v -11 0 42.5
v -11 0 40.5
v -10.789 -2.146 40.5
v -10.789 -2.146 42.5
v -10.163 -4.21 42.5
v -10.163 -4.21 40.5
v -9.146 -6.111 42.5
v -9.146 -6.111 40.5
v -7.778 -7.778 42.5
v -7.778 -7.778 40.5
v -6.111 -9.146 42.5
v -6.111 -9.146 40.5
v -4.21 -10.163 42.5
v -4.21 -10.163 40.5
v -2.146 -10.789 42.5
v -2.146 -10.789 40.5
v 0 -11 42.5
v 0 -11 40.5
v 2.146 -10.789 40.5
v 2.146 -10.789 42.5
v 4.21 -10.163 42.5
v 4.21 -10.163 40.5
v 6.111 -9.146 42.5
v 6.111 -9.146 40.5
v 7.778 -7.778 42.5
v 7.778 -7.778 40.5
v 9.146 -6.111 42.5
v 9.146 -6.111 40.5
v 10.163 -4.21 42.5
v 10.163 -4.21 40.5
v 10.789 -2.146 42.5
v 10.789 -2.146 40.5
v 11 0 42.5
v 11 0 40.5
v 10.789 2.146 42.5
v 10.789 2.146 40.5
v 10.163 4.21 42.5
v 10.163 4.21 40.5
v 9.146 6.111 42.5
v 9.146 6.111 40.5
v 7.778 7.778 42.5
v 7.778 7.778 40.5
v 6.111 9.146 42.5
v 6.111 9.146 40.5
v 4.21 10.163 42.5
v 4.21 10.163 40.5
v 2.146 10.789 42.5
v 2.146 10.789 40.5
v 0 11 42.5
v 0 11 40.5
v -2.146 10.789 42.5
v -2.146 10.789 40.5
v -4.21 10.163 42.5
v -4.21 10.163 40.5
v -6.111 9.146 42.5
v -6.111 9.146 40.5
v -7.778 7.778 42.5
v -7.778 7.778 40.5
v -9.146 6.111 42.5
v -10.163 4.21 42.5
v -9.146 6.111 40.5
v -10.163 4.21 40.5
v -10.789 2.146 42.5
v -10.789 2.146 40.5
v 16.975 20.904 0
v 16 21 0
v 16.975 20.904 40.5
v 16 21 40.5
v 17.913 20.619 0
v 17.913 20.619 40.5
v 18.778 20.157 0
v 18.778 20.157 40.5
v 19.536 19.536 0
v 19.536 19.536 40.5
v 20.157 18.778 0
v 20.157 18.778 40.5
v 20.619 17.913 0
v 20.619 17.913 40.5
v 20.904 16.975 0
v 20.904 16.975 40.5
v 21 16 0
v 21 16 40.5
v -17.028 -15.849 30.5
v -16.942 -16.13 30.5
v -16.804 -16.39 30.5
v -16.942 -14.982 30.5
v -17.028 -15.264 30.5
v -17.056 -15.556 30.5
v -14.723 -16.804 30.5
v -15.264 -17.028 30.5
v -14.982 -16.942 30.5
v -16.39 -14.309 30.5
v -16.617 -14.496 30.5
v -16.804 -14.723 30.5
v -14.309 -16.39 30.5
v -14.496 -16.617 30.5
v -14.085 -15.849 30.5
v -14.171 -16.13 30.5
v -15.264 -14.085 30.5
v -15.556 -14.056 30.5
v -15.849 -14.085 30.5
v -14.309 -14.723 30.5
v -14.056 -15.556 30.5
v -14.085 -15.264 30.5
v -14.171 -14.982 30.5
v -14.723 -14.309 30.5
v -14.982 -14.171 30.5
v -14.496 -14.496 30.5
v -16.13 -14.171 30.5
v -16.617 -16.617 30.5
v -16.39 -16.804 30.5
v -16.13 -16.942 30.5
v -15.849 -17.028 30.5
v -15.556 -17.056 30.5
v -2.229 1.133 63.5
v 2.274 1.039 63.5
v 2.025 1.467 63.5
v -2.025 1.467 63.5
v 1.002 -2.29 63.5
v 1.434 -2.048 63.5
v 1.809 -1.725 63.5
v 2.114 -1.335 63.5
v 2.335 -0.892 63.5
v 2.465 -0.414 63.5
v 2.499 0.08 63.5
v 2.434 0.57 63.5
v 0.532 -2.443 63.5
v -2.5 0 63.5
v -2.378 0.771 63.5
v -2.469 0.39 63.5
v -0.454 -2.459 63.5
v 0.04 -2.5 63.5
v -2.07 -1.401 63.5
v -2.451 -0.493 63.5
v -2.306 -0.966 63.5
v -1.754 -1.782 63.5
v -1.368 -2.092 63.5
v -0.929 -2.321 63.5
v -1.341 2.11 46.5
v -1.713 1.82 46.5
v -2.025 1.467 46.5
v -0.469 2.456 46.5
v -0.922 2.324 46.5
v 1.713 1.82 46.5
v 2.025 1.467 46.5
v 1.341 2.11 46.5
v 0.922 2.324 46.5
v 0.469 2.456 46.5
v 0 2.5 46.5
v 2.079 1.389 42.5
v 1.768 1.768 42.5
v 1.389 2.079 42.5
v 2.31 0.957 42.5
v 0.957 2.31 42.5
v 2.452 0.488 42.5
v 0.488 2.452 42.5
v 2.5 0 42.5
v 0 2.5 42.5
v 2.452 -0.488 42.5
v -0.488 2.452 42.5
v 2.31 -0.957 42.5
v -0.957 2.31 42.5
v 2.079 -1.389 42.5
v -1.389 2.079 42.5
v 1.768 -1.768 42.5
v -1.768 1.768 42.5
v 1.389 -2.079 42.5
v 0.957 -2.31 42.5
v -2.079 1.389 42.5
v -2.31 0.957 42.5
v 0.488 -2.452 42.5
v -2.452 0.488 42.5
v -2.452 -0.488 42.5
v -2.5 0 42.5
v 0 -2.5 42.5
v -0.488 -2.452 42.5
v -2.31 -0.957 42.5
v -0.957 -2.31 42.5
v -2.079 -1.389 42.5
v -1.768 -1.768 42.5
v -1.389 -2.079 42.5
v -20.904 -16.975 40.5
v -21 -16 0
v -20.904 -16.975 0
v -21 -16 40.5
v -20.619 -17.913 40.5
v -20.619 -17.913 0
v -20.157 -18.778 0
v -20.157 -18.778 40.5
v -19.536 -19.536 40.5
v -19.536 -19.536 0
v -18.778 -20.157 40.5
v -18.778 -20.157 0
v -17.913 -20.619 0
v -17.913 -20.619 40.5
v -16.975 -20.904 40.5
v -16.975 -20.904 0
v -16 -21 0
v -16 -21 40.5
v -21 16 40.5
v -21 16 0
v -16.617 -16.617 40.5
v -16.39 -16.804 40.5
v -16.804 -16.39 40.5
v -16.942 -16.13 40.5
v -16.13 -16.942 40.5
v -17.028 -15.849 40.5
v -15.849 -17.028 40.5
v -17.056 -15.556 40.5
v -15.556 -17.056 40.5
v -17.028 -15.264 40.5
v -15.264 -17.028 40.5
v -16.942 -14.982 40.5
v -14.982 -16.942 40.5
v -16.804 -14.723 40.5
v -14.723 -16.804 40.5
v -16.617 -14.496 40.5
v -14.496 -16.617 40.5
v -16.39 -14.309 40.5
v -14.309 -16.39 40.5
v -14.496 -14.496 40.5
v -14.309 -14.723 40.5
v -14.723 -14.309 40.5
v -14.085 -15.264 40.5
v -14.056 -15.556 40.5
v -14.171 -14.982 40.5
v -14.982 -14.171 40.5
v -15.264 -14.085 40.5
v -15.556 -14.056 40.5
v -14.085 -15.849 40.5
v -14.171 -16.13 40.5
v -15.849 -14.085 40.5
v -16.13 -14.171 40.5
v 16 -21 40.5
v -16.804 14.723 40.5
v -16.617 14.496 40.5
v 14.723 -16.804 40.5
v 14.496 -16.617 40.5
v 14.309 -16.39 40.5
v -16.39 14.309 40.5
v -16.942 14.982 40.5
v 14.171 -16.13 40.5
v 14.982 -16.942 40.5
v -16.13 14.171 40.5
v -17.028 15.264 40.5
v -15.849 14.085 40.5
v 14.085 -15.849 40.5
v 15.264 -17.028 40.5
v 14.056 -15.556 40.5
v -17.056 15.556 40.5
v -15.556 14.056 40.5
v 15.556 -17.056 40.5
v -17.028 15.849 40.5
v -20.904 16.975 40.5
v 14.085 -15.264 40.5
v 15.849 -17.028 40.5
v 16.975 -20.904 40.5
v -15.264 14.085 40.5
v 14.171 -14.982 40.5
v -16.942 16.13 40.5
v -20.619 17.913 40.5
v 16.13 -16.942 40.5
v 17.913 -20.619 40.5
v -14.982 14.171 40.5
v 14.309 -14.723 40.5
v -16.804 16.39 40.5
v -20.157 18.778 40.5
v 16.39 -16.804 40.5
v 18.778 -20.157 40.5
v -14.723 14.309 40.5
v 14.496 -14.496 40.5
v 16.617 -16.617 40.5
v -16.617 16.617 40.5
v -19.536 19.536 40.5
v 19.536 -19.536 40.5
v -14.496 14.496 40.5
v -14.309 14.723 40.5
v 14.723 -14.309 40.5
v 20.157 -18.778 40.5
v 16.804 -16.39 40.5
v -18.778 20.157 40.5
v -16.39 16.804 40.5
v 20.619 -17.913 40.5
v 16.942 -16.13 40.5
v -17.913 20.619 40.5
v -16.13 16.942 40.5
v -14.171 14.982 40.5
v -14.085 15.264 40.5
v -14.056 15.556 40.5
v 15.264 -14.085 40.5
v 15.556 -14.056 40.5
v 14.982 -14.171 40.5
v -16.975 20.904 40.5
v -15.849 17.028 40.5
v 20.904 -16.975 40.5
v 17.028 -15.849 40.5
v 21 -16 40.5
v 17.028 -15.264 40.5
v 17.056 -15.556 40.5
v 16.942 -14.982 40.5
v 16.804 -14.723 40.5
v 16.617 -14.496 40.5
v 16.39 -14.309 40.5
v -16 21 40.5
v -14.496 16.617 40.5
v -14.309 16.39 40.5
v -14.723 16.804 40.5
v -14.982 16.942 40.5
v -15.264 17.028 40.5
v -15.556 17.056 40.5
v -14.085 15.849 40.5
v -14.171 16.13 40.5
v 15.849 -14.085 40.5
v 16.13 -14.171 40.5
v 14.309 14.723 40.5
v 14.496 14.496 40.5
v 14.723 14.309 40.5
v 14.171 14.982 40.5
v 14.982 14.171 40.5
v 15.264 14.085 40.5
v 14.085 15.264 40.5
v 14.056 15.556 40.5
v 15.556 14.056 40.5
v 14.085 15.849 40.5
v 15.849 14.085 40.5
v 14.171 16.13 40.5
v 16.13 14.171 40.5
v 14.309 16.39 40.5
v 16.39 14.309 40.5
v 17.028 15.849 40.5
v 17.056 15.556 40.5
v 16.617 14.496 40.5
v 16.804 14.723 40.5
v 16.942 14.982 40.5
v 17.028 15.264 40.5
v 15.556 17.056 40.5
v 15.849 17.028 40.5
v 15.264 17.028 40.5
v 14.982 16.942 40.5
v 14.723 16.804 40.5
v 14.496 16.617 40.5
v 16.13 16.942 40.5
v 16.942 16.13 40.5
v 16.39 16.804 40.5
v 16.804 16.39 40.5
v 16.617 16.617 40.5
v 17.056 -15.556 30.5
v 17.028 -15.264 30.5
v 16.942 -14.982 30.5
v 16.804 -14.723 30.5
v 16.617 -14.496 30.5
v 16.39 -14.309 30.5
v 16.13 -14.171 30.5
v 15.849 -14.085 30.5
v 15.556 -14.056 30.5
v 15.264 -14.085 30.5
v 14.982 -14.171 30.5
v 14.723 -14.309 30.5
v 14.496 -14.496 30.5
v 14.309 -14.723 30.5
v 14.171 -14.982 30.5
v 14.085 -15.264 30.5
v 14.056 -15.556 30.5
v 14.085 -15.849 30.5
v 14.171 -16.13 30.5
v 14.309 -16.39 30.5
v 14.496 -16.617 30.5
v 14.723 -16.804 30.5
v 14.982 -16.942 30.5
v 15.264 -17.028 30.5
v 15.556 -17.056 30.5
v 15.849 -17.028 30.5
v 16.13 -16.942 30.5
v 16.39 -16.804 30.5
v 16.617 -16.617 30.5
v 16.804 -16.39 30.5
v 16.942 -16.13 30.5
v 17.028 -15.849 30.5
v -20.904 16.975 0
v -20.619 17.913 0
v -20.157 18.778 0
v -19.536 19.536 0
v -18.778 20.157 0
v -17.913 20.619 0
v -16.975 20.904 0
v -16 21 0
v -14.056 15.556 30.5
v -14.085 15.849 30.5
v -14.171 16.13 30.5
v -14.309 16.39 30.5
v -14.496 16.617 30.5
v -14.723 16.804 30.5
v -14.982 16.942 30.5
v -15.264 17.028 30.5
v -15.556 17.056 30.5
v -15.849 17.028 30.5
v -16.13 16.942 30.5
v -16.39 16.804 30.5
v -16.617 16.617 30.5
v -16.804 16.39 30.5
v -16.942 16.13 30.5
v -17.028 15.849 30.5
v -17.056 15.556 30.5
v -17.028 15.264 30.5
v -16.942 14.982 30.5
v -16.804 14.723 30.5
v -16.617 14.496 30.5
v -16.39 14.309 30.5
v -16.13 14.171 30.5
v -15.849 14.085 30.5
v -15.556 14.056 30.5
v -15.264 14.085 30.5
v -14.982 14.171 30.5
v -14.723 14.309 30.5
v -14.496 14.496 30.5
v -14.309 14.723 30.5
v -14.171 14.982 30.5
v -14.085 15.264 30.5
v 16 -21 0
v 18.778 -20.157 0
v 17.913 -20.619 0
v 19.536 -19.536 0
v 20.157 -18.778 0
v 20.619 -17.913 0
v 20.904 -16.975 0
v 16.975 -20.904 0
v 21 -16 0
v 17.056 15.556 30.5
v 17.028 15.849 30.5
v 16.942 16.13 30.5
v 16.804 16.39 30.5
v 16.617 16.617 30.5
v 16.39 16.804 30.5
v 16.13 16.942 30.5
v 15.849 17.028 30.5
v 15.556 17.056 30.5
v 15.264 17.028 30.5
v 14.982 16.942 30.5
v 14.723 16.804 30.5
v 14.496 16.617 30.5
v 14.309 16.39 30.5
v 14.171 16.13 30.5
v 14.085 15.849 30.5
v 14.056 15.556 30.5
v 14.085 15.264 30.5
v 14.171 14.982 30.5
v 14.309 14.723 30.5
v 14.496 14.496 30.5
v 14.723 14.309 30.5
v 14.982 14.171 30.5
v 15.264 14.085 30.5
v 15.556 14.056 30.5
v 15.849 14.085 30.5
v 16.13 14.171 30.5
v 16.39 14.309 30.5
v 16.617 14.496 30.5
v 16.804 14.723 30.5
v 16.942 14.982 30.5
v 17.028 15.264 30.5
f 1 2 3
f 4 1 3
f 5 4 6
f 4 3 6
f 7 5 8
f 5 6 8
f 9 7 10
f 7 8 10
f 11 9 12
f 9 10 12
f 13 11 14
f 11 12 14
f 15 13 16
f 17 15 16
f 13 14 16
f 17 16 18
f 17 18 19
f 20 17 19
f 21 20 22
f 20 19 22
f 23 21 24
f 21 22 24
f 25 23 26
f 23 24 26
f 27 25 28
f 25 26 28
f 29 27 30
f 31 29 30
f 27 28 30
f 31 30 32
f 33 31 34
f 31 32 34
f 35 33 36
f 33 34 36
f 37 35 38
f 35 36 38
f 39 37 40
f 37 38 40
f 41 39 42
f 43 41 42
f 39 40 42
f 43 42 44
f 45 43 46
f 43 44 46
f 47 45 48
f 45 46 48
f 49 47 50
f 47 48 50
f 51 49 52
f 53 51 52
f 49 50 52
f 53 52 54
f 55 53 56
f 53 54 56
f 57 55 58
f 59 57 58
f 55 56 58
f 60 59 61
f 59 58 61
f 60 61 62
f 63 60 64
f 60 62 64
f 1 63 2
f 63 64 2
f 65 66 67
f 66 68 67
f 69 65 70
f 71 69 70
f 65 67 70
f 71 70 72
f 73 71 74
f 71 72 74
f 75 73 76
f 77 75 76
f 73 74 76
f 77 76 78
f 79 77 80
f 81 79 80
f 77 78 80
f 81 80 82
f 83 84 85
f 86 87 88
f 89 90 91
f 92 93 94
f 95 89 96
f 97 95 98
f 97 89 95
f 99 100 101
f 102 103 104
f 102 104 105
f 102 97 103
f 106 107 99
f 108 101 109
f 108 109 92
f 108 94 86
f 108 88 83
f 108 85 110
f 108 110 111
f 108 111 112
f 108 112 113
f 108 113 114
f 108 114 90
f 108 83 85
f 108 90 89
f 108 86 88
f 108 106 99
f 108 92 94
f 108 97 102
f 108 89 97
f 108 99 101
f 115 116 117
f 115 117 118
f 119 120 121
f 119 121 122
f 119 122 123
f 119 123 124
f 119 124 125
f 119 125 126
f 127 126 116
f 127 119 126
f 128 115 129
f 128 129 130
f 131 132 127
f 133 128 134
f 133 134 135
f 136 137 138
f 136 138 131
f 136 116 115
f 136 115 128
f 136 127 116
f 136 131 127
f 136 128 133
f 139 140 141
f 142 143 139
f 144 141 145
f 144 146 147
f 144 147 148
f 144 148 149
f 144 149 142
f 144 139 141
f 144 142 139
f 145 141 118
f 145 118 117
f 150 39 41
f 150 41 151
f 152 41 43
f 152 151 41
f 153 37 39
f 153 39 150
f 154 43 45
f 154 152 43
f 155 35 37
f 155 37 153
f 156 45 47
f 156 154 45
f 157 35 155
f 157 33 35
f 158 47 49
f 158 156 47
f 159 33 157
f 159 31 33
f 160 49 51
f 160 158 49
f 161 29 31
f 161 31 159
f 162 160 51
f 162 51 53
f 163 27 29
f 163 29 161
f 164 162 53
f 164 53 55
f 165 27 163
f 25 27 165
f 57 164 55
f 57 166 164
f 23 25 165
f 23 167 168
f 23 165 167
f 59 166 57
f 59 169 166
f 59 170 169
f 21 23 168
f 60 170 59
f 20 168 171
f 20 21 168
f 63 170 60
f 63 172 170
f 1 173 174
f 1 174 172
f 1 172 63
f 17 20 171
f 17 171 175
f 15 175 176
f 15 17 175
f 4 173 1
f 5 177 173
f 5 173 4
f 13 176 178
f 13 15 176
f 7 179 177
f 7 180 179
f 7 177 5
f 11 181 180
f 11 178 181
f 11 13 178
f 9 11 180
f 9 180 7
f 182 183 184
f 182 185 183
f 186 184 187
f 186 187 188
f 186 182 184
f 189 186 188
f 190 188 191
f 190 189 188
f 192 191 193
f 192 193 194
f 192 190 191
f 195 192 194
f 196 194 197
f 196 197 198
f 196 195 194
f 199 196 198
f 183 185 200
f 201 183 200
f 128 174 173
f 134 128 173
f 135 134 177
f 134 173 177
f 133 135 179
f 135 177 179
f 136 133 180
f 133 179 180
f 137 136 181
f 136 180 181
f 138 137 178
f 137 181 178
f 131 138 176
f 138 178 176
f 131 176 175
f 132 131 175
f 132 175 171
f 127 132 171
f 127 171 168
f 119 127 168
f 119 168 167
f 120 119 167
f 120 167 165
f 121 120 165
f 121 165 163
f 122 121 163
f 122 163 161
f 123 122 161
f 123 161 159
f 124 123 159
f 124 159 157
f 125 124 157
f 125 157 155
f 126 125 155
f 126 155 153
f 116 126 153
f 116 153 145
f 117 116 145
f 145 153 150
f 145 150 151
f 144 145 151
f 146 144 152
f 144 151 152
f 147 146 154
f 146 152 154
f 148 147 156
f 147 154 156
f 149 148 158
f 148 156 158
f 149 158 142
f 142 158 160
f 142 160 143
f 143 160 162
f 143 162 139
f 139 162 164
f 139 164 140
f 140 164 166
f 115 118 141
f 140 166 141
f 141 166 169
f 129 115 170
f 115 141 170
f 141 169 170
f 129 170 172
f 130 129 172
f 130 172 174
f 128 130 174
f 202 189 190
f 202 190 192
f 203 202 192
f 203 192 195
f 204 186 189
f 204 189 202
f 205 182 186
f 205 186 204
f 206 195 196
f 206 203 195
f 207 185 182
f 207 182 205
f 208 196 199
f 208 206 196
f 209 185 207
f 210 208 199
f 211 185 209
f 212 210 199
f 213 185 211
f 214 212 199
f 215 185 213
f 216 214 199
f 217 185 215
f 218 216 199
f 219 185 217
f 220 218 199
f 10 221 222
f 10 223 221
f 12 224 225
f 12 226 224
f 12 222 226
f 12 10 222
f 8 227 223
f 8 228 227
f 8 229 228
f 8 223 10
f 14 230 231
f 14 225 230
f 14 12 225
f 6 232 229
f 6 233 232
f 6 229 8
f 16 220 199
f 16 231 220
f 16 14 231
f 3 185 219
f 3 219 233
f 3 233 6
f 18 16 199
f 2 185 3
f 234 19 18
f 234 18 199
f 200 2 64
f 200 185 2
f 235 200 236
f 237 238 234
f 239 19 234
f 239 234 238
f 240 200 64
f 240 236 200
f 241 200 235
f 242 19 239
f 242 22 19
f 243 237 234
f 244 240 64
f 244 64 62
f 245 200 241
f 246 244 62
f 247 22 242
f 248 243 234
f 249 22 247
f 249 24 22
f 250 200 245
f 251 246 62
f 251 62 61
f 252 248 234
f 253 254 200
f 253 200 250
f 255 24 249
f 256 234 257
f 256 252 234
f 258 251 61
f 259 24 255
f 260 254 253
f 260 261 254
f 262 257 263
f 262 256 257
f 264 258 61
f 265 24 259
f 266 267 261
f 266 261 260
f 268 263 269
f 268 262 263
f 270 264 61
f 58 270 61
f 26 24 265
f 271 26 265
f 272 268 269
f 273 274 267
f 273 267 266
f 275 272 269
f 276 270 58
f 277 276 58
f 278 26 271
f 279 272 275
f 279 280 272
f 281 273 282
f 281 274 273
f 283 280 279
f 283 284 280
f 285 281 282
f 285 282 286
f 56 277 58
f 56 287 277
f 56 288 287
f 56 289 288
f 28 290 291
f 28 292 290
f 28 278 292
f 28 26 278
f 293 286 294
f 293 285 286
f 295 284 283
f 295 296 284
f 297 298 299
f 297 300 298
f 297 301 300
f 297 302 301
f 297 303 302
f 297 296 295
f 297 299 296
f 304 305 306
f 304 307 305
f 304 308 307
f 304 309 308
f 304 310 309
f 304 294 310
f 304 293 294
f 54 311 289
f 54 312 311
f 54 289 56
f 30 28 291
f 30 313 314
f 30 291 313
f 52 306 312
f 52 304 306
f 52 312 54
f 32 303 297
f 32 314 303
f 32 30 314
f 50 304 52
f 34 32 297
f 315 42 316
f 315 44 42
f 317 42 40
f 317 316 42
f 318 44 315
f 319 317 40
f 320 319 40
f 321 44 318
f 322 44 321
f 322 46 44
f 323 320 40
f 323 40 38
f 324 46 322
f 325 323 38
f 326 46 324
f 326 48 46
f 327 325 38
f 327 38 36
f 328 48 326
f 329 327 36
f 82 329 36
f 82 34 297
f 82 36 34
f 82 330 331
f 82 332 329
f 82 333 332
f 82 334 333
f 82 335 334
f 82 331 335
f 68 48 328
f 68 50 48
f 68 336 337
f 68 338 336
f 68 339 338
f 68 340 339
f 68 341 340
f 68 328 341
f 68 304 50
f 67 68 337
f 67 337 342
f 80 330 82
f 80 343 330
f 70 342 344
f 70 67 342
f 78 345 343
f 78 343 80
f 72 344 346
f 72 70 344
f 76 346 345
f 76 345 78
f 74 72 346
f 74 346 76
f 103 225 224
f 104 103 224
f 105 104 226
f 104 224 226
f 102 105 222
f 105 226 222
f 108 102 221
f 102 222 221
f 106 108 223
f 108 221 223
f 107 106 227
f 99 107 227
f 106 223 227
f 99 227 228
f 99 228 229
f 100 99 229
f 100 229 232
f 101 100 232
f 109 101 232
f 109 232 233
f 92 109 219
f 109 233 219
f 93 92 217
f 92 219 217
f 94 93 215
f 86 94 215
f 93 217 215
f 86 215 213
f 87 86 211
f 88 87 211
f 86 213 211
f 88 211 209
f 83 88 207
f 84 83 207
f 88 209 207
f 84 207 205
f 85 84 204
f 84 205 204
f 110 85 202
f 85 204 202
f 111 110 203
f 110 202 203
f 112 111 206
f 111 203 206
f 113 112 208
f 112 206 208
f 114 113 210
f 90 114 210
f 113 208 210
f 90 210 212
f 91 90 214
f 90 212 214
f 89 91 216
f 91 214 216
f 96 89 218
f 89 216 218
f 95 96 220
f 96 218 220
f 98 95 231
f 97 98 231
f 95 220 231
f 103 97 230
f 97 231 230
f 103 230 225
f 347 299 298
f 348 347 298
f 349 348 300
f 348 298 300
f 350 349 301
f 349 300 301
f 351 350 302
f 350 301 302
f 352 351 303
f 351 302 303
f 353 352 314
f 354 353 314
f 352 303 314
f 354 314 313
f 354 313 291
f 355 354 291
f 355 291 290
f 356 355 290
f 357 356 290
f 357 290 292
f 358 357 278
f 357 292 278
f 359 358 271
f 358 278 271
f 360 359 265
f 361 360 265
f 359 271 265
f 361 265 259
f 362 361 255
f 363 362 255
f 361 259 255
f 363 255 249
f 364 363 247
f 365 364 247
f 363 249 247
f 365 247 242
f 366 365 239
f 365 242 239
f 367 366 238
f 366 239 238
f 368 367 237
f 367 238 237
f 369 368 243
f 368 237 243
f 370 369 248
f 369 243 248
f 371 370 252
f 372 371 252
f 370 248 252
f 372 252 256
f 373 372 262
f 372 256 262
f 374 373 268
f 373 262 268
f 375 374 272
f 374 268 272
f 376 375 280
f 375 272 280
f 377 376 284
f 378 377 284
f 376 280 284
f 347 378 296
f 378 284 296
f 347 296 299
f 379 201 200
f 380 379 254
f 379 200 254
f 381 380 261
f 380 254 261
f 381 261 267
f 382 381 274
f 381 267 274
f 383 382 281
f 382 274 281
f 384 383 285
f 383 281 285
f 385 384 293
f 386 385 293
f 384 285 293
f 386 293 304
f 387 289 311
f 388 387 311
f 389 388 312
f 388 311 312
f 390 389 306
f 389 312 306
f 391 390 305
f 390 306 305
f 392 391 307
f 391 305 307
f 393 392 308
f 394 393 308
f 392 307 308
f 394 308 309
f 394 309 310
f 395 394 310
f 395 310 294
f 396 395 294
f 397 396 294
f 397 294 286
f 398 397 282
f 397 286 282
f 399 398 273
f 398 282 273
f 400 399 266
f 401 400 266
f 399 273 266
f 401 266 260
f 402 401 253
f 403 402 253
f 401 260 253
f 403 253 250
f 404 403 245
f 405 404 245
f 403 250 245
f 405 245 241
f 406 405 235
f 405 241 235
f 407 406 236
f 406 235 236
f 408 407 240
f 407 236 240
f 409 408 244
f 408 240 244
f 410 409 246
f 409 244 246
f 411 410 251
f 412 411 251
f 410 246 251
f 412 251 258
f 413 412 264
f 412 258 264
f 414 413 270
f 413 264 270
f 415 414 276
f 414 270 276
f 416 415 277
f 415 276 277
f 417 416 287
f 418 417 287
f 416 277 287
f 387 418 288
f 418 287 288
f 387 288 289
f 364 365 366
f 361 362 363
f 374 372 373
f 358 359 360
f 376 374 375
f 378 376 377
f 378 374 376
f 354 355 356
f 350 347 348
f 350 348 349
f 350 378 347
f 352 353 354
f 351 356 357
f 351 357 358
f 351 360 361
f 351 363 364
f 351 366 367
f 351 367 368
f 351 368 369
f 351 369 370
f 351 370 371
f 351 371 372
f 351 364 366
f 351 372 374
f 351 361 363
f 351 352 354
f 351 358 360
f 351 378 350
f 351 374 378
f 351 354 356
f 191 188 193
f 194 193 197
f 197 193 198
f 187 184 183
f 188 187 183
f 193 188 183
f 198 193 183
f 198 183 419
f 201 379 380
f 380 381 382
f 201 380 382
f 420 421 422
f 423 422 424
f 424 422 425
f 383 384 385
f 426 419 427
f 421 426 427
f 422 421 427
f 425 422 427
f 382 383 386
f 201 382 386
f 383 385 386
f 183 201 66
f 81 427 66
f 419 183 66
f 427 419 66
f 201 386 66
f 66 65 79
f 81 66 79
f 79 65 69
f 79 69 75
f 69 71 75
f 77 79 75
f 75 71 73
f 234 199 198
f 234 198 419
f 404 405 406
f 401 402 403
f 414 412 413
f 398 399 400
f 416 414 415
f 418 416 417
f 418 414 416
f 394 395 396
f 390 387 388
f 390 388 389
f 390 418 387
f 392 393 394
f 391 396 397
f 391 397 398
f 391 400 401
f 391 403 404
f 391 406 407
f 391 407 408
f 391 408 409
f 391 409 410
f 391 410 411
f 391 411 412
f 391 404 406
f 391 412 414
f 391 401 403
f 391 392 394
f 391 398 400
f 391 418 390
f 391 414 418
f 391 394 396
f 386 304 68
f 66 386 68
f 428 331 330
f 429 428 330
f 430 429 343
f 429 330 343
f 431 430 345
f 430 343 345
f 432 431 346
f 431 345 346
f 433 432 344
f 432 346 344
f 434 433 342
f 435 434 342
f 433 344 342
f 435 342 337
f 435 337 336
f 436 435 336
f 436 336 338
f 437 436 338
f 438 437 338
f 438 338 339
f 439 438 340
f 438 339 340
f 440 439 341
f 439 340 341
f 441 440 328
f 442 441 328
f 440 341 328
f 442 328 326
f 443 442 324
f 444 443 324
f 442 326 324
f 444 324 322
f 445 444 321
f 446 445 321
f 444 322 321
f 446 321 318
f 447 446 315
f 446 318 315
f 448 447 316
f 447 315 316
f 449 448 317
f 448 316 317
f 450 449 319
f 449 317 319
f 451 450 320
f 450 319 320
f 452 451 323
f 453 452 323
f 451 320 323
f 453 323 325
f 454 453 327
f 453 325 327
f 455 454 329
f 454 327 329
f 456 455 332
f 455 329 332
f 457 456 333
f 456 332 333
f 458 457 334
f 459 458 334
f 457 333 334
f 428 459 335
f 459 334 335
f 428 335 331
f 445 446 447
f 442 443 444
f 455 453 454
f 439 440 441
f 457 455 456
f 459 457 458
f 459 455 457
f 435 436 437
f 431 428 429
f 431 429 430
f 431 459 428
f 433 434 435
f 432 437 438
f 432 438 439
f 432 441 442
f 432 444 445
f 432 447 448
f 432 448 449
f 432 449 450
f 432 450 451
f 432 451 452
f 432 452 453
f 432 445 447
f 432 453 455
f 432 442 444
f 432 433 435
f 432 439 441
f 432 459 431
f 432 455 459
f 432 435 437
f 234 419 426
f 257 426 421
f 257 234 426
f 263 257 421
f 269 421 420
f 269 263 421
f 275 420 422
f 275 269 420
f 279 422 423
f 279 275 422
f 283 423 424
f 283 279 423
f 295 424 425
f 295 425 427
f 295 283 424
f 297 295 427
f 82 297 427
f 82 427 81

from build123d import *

# Parameters (mm, degrees)
SKETCH1_W           = 42
SKETCH1_H           = 42
BOSS_EXTRUDE1_DEPTH = 40.5
SKETCH2_R           = 11
BOSS_EXTRUDE2_DEPTH = 2
SKETCH3_R           = 2.5
BOSS_EXTRUDE3_DEPTH = 21
FILLET1_R           = 5
SKETCH4_R           = 1.5
CUT_EXTRUDE1_DEPTH  = 10
CUT_EXTRUDE2_START  = -17
CUT_EXTRUDE2_DEPTH  = 17


with BuildPart() as part:
    # Sketch1 → Boss-Extrude1 (new body)
    with BuildSketch(Plane.XY):
        Rectangle(SKETCH1_W, SKETCH1_H)
    extrude(amount=BOSS_EXTRUDE1_DEPTH)

    # Sketch2 → Boss-Extrude2 (add)
    with BuildSketch(Plane.XY.offset(40.5)):
        with Locations(Location((0, 0, 0), (0, 0, 180))):
            Circle(SKETCH2_R)
    extrude(amount=BOSS_EXTRUDE2_DEPTH)

    # Sketch3 → Boss-Extrude3 (add)
    with BuildSketch(Plane.XY.offset(42.5)):
        with Locations(Location((0, 0, 0), (0, 0, 180))):
            Circle(SKETCH3_R)
    extrude(amount=BOSS_EXTRUDE3_DEPTH)

    # Fillet1
    fillet1_edges = [part.edges().sort_by_distance(p)[0] for p in [
        (21, -21, 20.25),
        (-21, -21, 20.25),
        (-21, 21, 20.25),
        (21, 21, 20.25),
    ]]
    fillet(fillet1_edges, radius=FILLET1_R)

    # Sketch4 → Cut-Extrude1 (cut)
    with BuildSketch(Plane.XY.offset(40.5)):
        with Locations((15.556349186, 15.556349186)):
            Circle(SKETCH4_R)
        with Locations((-15.556349186, -15.556349186)):
            Circle(SKETCH4_R)
        with Locations((15.556349186, -15.556349186)):
            Circle(SKETCH4_R)
        with Locations((-15.556349186, 15.556349186)):
            Circle(SKETCH4_R)
    extrude(amount=-CUT_EXTRUDE1_DEPTH, mode=Mode.SUBTRACT)

    # Sketch5 → Cut-Extrude2 (cut)
    with BuildSketch(Plane.XY.offset(63.5).offset(CUT_EXTRUDE2_START)):
        with BuildLine():
            Line((-2.024666714, 1.466534929), (2.024666714, 1.466534929))
            ThreePointArc((2.024666714, 1.466534929), (0, 2.5), (-2.024666714, 1.466534929))
        make_face()
    extrude(amount=CUT_EXTRUDE2_DEPTH, mode=Mode.SUBTRACT)


solid = part.part
